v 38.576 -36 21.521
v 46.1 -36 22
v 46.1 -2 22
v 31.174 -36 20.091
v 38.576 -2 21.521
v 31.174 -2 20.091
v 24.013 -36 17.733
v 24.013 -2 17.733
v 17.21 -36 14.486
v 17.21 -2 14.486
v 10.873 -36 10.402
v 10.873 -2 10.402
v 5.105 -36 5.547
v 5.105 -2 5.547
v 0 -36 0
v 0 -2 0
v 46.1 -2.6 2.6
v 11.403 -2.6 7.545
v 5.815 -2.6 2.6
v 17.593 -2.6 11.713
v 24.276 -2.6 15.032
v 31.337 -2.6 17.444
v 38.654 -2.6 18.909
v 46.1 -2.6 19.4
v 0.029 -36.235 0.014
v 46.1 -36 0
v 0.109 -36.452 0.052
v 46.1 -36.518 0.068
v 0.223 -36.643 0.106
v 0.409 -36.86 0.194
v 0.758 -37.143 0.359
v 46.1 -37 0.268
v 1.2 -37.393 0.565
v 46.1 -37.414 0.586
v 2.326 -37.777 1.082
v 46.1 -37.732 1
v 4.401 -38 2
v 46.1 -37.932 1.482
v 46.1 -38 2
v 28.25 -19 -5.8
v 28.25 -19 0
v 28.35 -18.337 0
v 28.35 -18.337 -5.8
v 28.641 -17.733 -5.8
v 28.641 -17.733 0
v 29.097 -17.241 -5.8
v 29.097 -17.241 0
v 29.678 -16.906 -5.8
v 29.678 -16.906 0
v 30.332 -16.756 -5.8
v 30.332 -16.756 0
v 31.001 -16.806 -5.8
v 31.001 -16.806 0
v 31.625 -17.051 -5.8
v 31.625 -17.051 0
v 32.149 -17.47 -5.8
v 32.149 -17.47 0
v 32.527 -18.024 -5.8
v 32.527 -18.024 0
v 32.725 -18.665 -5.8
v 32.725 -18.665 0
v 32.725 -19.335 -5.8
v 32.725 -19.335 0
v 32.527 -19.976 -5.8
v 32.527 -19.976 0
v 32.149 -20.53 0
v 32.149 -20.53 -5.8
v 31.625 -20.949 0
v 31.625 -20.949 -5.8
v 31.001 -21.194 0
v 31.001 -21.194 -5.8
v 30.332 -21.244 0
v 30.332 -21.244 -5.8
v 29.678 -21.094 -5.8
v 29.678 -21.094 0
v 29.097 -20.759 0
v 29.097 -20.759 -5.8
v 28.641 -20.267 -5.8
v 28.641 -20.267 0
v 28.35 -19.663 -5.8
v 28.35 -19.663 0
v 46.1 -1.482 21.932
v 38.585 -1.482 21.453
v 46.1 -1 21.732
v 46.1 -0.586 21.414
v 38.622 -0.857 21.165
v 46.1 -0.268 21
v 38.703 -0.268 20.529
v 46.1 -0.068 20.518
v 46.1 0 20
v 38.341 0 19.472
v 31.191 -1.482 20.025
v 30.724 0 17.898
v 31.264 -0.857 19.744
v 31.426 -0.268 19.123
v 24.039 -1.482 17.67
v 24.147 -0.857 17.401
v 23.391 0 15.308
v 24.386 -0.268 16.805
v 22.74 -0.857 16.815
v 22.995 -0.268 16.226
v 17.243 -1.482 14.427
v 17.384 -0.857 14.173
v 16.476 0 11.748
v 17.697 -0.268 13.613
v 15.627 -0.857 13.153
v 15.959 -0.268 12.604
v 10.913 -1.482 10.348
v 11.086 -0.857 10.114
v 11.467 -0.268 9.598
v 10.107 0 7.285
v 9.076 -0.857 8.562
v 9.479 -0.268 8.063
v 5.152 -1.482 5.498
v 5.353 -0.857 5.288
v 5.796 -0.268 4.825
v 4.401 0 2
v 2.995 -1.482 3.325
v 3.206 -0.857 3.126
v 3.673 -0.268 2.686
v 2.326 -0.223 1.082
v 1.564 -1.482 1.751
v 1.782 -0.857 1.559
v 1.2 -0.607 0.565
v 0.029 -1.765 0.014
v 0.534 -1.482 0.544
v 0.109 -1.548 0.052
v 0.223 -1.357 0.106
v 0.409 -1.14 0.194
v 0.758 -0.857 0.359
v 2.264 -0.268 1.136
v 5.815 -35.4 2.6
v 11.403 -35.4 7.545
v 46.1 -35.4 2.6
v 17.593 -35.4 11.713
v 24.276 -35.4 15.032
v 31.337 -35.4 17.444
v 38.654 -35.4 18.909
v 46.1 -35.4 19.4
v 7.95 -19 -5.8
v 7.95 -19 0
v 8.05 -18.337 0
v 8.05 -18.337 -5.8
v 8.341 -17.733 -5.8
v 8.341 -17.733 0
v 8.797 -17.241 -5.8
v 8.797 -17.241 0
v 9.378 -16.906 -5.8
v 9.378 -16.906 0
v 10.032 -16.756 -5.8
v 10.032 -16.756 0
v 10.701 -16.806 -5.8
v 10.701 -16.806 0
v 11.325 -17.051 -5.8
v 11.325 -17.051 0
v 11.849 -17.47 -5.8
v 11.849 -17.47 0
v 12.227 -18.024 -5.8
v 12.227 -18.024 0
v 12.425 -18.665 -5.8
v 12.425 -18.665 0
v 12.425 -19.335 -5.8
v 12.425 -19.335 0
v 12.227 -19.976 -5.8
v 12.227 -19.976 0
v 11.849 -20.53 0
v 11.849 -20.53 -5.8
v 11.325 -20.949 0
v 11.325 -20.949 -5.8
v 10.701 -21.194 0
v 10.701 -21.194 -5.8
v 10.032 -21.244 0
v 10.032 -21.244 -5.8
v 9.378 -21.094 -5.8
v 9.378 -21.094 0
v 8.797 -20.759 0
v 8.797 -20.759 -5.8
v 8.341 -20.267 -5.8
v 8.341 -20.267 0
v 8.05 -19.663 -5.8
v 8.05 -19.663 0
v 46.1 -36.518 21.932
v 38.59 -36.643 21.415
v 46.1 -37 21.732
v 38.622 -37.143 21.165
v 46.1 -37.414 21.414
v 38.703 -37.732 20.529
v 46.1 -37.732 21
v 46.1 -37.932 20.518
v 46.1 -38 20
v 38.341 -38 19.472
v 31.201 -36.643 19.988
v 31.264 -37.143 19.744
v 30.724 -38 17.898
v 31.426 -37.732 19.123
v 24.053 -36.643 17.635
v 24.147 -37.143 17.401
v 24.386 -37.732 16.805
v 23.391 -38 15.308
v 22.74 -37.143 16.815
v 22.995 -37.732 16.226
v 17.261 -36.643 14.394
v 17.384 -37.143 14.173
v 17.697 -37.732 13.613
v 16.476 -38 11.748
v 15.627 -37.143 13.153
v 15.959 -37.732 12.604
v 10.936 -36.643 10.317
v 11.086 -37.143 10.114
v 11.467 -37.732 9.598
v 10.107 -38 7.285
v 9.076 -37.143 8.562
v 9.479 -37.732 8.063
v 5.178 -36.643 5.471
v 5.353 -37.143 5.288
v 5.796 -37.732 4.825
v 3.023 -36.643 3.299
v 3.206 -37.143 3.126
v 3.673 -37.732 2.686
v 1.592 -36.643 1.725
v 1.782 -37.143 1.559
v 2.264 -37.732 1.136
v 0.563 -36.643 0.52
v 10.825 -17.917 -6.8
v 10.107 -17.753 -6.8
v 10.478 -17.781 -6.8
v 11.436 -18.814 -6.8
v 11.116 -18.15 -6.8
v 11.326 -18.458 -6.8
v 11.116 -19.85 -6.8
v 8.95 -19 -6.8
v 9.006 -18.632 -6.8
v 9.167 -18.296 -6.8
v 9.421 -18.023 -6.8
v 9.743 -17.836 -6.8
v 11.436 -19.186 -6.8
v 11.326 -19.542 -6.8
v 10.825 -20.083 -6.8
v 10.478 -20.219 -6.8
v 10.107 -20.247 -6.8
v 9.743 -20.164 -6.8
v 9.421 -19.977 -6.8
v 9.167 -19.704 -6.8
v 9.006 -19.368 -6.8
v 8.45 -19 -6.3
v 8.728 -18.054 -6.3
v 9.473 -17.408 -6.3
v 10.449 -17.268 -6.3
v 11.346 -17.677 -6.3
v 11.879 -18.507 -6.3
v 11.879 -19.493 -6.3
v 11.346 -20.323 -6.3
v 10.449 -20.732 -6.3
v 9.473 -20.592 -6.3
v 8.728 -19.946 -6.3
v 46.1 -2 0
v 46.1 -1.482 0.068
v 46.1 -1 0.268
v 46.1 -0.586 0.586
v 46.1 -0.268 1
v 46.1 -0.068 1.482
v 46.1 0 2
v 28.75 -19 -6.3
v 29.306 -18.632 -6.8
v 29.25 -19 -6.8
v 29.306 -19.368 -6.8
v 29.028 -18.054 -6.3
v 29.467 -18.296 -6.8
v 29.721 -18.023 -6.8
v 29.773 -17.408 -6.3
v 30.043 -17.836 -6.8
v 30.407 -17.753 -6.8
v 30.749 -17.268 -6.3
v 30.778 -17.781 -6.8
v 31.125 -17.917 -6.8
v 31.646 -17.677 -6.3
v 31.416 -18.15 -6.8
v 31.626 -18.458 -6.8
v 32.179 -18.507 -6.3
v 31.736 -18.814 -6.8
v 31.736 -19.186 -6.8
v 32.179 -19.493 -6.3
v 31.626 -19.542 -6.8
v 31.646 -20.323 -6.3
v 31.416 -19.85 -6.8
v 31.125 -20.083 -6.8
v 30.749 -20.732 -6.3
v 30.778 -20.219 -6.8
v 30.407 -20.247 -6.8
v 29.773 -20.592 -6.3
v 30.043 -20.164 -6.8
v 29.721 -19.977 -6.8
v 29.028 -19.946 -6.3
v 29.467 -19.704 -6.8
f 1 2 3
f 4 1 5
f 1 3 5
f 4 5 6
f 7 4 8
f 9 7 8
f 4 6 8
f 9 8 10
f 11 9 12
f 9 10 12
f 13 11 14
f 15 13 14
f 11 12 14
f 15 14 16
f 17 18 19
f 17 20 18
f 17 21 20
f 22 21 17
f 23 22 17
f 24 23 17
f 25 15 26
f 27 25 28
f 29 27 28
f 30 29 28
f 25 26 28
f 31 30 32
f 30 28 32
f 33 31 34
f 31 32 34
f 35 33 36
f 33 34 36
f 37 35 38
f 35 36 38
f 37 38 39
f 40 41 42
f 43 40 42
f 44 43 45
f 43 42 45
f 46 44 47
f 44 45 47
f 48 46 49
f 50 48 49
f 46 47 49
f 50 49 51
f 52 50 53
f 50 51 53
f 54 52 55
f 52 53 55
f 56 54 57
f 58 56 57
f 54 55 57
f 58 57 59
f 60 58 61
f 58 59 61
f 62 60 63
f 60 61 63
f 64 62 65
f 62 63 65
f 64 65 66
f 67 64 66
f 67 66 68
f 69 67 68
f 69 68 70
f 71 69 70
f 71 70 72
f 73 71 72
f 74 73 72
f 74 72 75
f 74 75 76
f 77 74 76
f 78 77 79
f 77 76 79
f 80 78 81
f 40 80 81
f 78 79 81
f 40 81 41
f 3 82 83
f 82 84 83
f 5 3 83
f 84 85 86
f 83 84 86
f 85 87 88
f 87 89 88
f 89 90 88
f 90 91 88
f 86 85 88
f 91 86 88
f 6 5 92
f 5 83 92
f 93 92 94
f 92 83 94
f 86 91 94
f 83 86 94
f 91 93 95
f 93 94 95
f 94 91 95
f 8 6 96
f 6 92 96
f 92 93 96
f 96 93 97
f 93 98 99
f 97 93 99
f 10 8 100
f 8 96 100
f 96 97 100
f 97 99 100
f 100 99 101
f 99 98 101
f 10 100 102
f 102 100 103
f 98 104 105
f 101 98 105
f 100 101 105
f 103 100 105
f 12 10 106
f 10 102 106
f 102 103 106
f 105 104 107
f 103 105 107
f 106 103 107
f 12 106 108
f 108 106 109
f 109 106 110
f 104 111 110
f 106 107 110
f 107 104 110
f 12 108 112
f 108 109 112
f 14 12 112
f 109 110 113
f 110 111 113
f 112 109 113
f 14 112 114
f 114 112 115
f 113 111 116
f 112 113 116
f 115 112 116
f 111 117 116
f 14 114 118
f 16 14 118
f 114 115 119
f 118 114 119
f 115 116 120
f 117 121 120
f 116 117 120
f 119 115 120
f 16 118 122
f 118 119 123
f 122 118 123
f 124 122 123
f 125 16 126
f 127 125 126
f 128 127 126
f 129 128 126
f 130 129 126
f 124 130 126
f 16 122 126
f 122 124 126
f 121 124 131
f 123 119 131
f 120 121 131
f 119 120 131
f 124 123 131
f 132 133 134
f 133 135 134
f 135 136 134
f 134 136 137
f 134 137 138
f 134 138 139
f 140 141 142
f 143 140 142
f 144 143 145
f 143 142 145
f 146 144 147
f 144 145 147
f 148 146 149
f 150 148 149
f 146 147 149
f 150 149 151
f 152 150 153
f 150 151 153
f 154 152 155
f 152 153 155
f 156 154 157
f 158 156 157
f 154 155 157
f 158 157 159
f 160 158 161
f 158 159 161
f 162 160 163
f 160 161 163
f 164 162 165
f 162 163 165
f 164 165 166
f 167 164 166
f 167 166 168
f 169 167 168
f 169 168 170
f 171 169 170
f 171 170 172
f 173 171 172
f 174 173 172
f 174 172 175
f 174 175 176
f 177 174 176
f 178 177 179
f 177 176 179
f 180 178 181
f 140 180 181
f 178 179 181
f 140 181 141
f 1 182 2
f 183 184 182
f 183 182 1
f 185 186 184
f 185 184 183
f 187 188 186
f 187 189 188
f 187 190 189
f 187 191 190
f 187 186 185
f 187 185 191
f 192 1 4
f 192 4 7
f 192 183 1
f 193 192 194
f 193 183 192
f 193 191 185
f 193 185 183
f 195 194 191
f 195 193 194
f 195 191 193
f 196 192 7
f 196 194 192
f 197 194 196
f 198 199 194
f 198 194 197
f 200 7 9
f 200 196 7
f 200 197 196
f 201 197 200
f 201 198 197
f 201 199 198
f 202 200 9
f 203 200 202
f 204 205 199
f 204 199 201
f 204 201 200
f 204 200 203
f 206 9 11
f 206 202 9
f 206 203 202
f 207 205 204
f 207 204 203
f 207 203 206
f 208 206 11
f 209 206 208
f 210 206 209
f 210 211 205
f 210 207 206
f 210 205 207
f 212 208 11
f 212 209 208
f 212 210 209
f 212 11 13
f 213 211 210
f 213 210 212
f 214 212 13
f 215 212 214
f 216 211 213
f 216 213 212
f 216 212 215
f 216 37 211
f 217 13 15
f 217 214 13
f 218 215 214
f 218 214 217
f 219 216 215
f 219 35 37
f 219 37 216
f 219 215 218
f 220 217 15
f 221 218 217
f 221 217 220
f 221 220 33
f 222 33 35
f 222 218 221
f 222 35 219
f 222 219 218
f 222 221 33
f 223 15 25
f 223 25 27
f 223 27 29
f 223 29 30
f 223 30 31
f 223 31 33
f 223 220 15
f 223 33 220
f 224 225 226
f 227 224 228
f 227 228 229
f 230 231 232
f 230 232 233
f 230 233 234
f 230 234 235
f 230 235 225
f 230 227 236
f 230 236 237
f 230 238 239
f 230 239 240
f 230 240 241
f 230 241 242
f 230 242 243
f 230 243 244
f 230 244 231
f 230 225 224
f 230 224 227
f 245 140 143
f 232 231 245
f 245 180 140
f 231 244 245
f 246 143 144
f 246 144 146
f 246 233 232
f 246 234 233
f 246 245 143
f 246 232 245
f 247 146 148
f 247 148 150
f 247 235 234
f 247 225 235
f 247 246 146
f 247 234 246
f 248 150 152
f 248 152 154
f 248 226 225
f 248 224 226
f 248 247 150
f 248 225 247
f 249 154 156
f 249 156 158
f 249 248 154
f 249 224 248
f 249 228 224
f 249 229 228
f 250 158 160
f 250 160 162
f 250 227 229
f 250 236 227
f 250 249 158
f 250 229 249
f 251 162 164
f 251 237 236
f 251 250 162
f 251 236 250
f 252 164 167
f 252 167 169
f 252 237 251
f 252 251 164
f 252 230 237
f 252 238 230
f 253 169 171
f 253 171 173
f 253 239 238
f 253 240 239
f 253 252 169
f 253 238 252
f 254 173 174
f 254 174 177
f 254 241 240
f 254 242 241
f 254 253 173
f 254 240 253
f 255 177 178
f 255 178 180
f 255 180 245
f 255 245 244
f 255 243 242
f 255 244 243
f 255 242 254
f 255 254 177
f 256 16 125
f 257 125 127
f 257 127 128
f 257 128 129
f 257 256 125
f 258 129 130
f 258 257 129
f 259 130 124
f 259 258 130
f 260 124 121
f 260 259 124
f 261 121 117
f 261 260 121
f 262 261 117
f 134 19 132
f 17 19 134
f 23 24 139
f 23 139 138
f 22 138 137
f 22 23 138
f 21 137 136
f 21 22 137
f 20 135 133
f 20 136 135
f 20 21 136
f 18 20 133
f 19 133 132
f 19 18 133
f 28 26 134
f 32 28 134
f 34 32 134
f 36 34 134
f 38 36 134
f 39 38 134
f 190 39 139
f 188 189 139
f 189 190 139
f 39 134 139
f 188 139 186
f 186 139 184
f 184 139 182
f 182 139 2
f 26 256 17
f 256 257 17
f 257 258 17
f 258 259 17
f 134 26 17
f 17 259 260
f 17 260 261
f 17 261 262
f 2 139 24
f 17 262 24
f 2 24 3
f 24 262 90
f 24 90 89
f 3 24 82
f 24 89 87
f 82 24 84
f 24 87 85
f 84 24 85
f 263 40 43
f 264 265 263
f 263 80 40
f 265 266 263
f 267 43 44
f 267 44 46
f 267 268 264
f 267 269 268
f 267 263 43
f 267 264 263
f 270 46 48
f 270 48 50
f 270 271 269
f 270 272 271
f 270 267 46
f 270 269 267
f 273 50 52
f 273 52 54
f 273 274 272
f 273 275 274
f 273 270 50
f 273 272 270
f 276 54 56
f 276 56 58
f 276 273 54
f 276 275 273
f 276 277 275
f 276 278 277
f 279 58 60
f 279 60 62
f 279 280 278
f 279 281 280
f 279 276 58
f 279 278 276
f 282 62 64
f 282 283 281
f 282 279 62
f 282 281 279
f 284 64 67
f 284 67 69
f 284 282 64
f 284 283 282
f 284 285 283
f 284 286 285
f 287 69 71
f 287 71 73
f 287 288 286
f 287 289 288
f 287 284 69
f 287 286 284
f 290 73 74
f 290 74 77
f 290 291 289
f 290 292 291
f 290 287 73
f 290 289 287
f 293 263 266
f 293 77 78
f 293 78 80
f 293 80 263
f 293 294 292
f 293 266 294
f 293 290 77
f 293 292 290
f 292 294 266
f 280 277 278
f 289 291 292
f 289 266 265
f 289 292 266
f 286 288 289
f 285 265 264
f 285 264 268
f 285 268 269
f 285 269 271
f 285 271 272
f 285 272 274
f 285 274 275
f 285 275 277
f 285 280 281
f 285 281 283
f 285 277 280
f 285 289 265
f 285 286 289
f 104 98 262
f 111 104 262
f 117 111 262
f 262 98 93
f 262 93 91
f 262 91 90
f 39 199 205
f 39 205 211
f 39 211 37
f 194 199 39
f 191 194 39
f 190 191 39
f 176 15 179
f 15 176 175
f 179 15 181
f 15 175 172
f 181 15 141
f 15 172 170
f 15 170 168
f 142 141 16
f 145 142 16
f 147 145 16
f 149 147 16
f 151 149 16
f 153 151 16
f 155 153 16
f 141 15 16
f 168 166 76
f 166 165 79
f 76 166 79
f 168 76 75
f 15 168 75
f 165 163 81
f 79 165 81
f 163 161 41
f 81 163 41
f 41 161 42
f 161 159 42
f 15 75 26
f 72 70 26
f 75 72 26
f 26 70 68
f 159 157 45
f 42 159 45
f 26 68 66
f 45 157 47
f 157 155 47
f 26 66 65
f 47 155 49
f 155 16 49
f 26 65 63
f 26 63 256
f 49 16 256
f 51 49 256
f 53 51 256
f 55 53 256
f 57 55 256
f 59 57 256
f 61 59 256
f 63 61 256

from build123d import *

# Parameters (mm, degrees)
F1_DEPTH = 38
F2_T     = -2.6
F3_R     = 2
F5_DEPTH = 6.8
F6_SIZE  = 1


with BuildPart() as f1:
    # F0 (on Front) → F1 (new body)
    with BuildSketch(Plane.XZ):
        with BuildLine():
            ThreePointArc((46.1, 22), (20.5597866101, 16.218128967), (0, 0))
            Line((0, 0), (46.1, 0))
            Line((46.1, 0), (46.1, 22))
        make_face()
    extrude(amount=F1_DEPTH)

    # F2
    f2_openings = [f1.faces().sort_by_distance(p)[0] for p in [
        (46.1, -19, 11),
    ]]
    offset(amount=F2_T, openings=f2_openings)

    # F3
    f3_edges = [f1.edges().sort_by_distance(p)[0] for p in [
        (20.559787, -38, 16.218129),
        (20.559787, 0, 16.218129),
        (23.05, 0, 0),
        (23.05, -38, 0),
    ]]
    fillet(f3_edges, radius=F3_R)

    # F4 (on face) → F5 (join)
    with BuildSketch(Plane(origin=(0, 0, 0), x_dir=(1, 0, 0), z_dir=(0, 0, -1))):
        with BuildLine():
            Line((7.95, 19), (12.45, 19))
            ThreePointArc((12.45, 19), (10.2, 21.25), (7.95, 19))
        make_face()
        with BuildLine():
            ThreePointArc((7.95, 19), (10.2, 16.75), (12.45, 19))
            Line((12.45, 19), (7.95, 19))
        make_face()
        with BuildLine():
            ThreePointArc((32.75, 19), (30.5, 21.25), (28.25, 19))
            Line((28.25, 19), (32.75, 19))
        make_face()
        with BuildLine():
            Line((32.75, 19), (28.25, 19))
            ThreePointArc((28.25, 19), (30.5, 16.75), (32.75, 19))
        make_face()
    extrude(amount=F5_DEPTH)

    # F6
    f6_edges = [f1.edges().sort_by_distance(p)[0] for p in [
        (12.45, -19, -6.8),
        (32.75, -19, -6.8),
    ]]
    chamfer(f6_edges, length=F6_SIZE)


solid = f1.part
